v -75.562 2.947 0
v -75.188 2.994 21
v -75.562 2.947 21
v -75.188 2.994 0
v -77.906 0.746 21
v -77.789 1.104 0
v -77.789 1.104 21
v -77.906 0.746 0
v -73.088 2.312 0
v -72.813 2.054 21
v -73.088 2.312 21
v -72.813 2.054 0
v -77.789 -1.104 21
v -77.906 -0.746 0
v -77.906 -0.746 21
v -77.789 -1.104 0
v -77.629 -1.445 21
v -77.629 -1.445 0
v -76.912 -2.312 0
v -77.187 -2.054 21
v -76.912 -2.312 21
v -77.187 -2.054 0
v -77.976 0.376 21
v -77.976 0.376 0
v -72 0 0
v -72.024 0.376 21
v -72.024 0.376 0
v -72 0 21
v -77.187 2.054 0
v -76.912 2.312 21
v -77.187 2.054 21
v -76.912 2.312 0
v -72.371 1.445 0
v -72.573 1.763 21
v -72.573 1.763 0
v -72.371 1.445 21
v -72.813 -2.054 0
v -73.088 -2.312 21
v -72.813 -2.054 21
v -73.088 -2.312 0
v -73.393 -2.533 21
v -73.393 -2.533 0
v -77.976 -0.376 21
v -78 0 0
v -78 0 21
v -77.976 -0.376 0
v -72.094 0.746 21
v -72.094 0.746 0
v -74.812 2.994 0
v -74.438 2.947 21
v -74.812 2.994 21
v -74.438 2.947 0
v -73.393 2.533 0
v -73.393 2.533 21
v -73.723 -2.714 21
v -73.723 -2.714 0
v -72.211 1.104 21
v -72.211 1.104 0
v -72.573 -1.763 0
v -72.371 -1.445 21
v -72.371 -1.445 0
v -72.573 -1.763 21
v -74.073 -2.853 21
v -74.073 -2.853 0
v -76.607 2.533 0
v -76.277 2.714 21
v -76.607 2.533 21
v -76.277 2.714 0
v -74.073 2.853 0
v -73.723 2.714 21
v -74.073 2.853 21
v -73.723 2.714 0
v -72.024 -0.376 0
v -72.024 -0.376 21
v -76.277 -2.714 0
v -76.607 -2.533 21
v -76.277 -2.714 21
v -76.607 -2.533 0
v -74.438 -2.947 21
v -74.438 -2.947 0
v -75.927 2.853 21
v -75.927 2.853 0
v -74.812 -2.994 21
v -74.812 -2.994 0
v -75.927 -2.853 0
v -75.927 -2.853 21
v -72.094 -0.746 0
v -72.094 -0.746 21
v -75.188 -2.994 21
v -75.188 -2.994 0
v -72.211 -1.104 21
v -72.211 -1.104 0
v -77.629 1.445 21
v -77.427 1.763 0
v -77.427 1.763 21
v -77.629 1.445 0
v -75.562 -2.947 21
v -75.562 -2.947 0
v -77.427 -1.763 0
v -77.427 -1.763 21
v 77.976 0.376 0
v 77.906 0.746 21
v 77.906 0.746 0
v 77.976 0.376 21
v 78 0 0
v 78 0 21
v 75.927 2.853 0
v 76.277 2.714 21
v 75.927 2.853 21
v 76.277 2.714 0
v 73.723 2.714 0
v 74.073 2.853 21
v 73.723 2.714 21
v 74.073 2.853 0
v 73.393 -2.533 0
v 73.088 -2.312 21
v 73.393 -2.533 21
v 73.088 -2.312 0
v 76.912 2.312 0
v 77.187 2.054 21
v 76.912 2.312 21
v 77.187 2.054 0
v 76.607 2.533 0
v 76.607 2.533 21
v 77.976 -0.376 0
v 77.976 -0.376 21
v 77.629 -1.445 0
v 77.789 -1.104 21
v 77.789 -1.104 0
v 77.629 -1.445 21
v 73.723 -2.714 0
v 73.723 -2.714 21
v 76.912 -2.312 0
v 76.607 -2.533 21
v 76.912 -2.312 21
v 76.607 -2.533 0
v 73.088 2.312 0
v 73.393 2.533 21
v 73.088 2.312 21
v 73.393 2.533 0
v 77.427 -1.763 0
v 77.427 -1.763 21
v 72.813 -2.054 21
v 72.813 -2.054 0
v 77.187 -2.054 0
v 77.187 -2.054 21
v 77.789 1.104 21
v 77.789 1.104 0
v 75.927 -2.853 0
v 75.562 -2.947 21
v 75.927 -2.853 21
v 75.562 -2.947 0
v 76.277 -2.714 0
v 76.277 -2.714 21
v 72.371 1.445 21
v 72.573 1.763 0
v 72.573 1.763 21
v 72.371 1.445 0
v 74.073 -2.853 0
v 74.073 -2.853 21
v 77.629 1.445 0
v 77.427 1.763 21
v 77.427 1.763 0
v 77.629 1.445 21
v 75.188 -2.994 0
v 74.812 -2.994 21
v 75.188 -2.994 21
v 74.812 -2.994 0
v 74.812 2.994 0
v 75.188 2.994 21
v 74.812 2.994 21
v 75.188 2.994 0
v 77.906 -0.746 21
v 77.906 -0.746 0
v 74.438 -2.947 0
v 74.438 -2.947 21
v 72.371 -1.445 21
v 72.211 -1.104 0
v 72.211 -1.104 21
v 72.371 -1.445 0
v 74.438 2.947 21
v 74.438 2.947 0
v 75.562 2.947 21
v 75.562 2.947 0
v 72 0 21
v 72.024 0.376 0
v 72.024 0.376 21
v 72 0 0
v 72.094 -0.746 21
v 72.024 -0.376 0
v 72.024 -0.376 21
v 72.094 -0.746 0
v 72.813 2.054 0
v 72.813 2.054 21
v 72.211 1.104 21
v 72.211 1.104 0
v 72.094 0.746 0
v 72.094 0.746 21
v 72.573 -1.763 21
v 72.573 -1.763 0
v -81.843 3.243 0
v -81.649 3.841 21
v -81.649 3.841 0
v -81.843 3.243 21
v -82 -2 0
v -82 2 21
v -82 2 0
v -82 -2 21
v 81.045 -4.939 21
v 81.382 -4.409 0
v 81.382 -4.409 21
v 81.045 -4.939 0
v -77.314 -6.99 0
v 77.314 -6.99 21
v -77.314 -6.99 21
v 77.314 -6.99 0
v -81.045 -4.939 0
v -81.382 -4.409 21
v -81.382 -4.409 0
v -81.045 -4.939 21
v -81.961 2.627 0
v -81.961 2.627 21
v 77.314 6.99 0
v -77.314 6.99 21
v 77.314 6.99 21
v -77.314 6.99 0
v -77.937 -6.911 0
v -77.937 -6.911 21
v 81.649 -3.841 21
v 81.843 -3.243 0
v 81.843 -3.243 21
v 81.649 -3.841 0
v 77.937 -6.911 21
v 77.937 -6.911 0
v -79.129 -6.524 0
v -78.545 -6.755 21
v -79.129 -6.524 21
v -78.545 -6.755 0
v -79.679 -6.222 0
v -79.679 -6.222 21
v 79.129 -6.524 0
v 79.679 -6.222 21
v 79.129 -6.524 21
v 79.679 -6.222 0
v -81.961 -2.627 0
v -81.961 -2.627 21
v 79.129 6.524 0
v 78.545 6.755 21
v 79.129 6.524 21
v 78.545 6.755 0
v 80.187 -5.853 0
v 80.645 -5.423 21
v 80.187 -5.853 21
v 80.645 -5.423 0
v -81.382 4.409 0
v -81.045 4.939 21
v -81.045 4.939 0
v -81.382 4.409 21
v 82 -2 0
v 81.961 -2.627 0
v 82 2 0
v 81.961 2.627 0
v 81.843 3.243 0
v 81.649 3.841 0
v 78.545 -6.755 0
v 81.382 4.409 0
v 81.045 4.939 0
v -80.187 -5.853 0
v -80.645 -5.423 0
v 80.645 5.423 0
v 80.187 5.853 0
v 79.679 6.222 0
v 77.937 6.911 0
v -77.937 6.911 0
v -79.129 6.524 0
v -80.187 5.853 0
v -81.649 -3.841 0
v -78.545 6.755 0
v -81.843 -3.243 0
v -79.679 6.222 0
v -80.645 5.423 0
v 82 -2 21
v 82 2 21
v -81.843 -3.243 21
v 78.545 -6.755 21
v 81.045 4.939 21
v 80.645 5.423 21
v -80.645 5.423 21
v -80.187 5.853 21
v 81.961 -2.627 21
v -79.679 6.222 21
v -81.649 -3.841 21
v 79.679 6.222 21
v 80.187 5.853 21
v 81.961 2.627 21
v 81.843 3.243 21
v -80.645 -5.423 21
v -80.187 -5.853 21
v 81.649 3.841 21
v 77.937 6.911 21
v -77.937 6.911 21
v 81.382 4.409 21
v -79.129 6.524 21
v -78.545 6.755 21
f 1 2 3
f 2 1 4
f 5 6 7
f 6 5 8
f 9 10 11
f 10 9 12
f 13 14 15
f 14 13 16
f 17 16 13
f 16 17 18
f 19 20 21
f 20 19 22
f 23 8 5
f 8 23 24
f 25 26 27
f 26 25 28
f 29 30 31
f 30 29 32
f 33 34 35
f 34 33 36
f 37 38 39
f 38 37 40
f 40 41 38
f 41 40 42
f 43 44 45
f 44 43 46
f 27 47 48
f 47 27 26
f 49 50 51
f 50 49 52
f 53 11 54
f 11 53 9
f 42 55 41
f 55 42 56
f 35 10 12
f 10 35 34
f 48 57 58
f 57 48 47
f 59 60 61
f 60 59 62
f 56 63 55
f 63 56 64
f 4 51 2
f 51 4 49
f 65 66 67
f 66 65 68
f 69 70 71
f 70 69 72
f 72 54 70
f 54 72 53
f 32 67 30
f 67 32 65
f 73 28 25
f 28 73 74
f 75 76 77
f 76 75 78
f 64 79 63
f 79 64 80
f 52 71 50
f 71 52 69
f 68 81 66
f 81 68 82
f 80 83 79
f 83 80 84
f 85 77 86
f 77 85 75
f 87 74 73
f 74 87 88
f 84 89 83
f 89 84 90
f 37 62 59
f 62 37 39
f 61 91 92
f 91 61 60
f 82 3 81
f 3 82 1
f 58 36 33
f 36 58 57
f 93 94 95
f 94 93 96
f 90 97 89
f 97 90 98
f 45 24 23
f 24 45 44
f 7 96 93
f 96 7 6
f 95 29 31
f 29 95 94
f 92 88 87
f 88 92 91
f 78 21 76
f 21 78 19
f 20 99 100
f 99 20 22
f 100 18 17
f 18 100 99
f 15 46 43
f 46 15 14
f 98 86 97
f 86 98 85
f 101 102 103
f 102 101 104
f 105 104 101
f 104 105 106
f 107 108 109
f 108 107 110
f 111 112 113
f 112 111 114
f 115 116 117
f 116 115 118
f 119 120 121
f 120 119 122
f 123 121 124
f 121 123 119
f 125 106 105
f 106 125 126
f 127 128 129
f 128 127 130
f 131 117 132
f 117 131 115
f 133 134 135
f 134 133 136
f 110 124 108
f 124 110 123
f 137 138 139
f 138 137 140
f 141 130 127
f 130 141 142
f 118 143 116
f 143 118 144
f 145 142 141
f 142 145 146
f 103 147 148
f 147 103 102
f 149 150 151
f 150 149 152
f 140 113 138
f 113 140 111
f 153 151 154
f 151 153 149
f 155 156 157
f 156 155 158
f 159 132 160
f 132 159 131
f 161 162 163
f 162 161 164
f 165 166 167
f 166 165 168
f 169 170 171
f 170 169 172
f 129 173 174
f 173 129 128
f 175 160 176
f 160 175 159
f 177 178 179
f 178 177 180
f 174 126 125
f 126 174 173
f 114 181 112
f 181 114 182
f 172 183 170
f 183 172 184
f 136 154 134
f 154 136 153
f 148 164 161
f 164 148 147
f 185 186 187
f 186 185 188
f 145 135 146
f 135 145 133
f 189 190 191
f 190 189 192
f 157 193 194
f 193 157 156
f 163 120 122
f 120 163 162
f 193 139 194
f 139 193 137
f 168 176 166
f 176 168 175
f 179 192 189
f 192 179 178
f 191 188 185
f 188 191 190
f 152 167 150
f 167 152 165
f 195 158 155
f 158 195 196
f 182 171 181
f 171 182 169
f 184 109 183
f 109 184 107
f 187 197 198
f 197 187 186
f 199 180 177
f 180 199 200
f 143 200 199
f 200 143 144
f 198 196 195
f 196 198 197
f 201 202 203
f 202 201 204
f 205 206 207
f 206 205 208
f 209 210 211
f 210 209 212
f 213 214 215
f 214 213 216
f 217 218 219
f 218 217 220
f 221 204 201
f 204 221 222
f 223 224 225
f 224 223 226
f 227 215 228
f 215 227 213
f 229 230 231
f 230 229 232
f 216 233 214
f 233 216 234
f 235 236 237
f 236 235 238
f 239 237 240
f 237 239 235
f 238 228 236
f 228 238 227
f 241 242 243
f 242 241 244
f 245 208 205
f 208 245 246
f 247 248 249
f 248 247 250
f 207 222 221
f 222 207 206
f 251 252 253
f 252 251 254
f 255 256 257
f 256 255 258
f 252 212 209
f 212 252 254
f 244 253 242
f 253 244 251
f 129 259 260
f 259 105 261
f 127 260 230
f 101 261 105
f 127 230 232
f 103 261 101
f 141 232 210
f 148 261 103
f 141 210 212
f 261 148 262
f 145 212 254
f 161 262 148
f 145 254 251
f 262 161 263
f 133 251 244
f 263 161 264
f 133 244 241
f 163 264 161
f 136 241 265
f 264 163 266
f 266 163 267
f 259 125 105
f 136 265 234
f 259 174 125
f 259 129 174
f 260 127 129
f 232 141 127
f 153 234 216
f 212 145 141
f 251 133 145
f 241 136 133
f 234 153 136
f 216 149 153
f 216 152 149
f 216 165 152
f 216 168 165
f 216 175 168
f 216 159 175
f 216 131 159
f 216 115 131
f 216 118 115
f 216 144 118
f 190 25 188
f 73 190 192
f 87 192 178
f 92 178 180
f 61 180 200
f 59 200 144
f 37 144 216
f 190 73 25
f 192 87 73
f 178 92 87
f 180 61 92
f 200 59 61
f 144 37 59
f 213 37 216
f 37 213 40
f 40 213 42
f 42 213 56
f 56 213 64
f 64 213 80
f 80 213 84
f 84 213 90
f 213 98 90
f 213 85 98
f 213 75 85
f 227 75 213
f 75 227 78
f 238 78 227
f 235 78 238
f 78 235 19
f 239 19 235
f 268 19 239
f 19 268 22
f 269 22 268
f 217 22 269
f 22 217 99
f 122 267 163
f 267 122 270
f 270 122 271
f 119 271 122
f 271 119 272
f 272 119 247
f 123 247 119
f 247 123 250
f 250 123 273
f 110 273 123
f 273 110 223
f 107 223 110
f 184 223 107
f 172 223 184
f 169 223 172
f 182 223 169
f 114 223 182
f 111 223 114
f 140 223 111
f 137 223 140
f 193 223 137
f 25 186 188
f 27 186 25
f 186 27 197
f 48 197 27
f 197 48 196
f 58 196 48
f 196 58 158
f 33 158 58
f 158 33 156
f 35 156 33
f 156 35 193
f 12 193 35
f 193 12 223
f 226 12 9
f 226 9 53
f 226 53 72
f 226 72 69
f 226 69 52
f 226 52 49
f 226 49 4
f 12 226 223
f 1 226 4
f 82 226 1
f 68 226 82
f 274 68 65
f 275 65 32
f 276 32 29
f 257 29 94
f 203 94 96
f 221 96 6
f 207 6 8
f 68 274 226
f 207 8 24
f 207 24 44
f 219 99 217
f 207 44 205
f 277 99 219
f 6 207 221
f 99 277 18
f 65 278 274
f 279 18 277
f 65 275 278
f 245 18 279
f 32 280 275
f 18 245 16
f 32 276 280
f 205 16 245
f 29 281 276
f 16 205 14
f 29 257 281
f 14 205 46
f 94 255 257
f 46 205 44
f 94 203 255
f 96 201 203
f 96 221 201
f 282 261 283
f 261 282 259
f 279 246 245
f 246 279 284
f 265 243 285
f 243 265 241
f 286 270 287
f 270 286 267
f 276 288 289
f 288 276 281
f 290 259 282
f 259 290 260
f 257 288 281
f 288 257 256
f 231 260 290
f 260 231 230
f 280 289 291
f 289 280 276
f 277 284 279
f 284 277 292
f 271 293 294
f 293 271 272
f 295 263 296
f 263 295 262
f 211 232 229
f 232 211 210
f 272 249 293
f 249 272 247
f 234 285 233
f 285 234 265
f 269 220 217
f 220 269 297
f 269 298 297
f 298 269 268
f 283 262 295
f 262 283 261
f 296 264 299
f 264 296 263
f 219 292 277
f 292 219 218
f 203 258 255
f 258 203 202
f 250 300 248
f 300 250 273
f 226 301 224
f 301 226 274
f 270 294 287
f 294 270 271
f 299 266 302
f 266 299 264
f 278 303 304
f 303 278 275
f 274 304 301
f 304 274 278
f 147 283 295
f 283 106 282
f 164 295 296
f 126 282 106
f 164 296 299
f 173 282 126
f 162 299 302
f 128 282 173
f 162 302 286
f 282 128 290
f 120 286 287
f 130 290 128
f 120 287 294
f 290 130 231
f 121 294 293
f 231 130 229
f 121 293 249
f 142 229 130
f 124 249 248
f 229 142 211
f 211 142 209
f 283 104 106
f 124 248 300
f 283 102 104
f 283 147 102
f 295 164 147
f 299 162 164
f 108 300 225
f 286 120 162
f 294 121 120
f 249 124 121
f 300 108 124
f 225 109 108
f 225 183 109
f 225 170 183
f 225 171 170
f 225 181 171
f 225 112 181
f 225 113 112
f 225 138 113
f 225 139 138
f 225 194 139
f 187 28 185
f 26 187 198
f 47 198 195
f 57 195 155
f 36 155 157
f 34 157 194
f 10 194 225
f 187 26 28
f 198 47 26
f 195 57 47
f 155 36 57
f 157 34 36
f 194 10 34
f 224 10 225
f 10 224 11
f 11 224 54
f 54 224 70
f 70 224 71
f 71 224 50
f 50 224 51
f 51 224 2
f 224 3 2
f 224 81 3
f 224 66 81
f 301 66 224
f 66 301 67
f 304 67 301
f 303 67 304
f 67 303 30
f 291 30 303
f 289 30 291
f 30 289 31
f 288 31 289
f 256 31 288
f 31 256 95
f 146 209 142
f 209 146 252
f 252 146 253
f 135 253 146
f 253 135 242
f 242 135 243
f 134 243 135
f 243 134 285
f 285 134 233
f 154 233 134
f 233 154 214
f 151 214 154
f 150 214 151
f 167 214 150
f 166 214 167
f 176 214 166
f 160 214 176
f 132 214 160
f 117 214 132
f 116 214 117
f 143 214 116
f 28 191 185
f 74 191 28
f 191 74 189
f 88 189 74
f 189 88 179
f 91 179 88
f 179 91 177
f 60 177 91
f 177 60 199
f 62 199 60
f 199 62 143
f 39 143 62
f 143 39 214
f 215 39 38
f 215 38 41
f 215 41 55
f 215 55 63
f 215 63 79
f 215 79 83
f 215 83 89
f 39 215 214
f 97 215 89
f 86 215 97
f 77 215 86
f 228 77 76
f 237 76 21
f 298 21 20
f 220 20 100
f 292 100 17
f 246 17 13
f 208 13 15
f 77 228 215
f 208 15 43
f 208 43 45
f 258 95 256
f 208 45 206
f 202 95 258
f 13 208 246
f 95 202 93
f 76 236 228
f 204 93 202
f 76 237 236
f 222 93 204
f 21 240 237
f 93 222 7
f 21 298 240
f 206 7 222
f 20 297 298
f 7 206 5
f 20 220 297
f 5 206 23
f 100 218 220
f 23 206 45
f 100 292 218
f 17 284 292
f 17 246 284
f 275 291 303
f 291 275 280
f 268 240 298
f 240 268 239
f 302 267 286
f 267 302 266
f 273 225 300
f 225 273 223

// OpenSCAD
$fn = 50;


difference() {
	union() {
		hull() {
			translate(v = [-77.0000000000, 2.0000000000, 0]) {
				cylinder(h = 21, r = 5);
			}
			translate(v = [77.0000000000, 2.0000000000, 0]) {
				cylinder(h = 21, r = 5);
			}
			translate(v = [-77.0000000000, -2.0000000000, 0]) {
				cylinder(h = 21, r = 5);
			}
			translate(v = [77.0000000000, -2.0000000000, 0]) {
				cylinder(h = 21, r = 5);
			}
		}
	}
	union() {
		translate(v = [-75.0000000000, 0.0000000000, -100.0000000000]) {
			cylinder(h = 200, r = 3.0000000000);
		}
		translate(v = [-75.0000000000, 0.0000000000, -100.0000000000]) {
			cylinder(h = 200, r = 3.0000000000);
		}
		translate(v = [75.0000000000, 0.0000000000, -100.0000000000]) {
			cylinder(h = 200, r = 3.0000000000);
		}
		translate(v = [75.0000000000, 0.0000000000, -100.0000000000]) {
			cylinder(h = 200, r = 3.0000000000);
		}
	}
}
